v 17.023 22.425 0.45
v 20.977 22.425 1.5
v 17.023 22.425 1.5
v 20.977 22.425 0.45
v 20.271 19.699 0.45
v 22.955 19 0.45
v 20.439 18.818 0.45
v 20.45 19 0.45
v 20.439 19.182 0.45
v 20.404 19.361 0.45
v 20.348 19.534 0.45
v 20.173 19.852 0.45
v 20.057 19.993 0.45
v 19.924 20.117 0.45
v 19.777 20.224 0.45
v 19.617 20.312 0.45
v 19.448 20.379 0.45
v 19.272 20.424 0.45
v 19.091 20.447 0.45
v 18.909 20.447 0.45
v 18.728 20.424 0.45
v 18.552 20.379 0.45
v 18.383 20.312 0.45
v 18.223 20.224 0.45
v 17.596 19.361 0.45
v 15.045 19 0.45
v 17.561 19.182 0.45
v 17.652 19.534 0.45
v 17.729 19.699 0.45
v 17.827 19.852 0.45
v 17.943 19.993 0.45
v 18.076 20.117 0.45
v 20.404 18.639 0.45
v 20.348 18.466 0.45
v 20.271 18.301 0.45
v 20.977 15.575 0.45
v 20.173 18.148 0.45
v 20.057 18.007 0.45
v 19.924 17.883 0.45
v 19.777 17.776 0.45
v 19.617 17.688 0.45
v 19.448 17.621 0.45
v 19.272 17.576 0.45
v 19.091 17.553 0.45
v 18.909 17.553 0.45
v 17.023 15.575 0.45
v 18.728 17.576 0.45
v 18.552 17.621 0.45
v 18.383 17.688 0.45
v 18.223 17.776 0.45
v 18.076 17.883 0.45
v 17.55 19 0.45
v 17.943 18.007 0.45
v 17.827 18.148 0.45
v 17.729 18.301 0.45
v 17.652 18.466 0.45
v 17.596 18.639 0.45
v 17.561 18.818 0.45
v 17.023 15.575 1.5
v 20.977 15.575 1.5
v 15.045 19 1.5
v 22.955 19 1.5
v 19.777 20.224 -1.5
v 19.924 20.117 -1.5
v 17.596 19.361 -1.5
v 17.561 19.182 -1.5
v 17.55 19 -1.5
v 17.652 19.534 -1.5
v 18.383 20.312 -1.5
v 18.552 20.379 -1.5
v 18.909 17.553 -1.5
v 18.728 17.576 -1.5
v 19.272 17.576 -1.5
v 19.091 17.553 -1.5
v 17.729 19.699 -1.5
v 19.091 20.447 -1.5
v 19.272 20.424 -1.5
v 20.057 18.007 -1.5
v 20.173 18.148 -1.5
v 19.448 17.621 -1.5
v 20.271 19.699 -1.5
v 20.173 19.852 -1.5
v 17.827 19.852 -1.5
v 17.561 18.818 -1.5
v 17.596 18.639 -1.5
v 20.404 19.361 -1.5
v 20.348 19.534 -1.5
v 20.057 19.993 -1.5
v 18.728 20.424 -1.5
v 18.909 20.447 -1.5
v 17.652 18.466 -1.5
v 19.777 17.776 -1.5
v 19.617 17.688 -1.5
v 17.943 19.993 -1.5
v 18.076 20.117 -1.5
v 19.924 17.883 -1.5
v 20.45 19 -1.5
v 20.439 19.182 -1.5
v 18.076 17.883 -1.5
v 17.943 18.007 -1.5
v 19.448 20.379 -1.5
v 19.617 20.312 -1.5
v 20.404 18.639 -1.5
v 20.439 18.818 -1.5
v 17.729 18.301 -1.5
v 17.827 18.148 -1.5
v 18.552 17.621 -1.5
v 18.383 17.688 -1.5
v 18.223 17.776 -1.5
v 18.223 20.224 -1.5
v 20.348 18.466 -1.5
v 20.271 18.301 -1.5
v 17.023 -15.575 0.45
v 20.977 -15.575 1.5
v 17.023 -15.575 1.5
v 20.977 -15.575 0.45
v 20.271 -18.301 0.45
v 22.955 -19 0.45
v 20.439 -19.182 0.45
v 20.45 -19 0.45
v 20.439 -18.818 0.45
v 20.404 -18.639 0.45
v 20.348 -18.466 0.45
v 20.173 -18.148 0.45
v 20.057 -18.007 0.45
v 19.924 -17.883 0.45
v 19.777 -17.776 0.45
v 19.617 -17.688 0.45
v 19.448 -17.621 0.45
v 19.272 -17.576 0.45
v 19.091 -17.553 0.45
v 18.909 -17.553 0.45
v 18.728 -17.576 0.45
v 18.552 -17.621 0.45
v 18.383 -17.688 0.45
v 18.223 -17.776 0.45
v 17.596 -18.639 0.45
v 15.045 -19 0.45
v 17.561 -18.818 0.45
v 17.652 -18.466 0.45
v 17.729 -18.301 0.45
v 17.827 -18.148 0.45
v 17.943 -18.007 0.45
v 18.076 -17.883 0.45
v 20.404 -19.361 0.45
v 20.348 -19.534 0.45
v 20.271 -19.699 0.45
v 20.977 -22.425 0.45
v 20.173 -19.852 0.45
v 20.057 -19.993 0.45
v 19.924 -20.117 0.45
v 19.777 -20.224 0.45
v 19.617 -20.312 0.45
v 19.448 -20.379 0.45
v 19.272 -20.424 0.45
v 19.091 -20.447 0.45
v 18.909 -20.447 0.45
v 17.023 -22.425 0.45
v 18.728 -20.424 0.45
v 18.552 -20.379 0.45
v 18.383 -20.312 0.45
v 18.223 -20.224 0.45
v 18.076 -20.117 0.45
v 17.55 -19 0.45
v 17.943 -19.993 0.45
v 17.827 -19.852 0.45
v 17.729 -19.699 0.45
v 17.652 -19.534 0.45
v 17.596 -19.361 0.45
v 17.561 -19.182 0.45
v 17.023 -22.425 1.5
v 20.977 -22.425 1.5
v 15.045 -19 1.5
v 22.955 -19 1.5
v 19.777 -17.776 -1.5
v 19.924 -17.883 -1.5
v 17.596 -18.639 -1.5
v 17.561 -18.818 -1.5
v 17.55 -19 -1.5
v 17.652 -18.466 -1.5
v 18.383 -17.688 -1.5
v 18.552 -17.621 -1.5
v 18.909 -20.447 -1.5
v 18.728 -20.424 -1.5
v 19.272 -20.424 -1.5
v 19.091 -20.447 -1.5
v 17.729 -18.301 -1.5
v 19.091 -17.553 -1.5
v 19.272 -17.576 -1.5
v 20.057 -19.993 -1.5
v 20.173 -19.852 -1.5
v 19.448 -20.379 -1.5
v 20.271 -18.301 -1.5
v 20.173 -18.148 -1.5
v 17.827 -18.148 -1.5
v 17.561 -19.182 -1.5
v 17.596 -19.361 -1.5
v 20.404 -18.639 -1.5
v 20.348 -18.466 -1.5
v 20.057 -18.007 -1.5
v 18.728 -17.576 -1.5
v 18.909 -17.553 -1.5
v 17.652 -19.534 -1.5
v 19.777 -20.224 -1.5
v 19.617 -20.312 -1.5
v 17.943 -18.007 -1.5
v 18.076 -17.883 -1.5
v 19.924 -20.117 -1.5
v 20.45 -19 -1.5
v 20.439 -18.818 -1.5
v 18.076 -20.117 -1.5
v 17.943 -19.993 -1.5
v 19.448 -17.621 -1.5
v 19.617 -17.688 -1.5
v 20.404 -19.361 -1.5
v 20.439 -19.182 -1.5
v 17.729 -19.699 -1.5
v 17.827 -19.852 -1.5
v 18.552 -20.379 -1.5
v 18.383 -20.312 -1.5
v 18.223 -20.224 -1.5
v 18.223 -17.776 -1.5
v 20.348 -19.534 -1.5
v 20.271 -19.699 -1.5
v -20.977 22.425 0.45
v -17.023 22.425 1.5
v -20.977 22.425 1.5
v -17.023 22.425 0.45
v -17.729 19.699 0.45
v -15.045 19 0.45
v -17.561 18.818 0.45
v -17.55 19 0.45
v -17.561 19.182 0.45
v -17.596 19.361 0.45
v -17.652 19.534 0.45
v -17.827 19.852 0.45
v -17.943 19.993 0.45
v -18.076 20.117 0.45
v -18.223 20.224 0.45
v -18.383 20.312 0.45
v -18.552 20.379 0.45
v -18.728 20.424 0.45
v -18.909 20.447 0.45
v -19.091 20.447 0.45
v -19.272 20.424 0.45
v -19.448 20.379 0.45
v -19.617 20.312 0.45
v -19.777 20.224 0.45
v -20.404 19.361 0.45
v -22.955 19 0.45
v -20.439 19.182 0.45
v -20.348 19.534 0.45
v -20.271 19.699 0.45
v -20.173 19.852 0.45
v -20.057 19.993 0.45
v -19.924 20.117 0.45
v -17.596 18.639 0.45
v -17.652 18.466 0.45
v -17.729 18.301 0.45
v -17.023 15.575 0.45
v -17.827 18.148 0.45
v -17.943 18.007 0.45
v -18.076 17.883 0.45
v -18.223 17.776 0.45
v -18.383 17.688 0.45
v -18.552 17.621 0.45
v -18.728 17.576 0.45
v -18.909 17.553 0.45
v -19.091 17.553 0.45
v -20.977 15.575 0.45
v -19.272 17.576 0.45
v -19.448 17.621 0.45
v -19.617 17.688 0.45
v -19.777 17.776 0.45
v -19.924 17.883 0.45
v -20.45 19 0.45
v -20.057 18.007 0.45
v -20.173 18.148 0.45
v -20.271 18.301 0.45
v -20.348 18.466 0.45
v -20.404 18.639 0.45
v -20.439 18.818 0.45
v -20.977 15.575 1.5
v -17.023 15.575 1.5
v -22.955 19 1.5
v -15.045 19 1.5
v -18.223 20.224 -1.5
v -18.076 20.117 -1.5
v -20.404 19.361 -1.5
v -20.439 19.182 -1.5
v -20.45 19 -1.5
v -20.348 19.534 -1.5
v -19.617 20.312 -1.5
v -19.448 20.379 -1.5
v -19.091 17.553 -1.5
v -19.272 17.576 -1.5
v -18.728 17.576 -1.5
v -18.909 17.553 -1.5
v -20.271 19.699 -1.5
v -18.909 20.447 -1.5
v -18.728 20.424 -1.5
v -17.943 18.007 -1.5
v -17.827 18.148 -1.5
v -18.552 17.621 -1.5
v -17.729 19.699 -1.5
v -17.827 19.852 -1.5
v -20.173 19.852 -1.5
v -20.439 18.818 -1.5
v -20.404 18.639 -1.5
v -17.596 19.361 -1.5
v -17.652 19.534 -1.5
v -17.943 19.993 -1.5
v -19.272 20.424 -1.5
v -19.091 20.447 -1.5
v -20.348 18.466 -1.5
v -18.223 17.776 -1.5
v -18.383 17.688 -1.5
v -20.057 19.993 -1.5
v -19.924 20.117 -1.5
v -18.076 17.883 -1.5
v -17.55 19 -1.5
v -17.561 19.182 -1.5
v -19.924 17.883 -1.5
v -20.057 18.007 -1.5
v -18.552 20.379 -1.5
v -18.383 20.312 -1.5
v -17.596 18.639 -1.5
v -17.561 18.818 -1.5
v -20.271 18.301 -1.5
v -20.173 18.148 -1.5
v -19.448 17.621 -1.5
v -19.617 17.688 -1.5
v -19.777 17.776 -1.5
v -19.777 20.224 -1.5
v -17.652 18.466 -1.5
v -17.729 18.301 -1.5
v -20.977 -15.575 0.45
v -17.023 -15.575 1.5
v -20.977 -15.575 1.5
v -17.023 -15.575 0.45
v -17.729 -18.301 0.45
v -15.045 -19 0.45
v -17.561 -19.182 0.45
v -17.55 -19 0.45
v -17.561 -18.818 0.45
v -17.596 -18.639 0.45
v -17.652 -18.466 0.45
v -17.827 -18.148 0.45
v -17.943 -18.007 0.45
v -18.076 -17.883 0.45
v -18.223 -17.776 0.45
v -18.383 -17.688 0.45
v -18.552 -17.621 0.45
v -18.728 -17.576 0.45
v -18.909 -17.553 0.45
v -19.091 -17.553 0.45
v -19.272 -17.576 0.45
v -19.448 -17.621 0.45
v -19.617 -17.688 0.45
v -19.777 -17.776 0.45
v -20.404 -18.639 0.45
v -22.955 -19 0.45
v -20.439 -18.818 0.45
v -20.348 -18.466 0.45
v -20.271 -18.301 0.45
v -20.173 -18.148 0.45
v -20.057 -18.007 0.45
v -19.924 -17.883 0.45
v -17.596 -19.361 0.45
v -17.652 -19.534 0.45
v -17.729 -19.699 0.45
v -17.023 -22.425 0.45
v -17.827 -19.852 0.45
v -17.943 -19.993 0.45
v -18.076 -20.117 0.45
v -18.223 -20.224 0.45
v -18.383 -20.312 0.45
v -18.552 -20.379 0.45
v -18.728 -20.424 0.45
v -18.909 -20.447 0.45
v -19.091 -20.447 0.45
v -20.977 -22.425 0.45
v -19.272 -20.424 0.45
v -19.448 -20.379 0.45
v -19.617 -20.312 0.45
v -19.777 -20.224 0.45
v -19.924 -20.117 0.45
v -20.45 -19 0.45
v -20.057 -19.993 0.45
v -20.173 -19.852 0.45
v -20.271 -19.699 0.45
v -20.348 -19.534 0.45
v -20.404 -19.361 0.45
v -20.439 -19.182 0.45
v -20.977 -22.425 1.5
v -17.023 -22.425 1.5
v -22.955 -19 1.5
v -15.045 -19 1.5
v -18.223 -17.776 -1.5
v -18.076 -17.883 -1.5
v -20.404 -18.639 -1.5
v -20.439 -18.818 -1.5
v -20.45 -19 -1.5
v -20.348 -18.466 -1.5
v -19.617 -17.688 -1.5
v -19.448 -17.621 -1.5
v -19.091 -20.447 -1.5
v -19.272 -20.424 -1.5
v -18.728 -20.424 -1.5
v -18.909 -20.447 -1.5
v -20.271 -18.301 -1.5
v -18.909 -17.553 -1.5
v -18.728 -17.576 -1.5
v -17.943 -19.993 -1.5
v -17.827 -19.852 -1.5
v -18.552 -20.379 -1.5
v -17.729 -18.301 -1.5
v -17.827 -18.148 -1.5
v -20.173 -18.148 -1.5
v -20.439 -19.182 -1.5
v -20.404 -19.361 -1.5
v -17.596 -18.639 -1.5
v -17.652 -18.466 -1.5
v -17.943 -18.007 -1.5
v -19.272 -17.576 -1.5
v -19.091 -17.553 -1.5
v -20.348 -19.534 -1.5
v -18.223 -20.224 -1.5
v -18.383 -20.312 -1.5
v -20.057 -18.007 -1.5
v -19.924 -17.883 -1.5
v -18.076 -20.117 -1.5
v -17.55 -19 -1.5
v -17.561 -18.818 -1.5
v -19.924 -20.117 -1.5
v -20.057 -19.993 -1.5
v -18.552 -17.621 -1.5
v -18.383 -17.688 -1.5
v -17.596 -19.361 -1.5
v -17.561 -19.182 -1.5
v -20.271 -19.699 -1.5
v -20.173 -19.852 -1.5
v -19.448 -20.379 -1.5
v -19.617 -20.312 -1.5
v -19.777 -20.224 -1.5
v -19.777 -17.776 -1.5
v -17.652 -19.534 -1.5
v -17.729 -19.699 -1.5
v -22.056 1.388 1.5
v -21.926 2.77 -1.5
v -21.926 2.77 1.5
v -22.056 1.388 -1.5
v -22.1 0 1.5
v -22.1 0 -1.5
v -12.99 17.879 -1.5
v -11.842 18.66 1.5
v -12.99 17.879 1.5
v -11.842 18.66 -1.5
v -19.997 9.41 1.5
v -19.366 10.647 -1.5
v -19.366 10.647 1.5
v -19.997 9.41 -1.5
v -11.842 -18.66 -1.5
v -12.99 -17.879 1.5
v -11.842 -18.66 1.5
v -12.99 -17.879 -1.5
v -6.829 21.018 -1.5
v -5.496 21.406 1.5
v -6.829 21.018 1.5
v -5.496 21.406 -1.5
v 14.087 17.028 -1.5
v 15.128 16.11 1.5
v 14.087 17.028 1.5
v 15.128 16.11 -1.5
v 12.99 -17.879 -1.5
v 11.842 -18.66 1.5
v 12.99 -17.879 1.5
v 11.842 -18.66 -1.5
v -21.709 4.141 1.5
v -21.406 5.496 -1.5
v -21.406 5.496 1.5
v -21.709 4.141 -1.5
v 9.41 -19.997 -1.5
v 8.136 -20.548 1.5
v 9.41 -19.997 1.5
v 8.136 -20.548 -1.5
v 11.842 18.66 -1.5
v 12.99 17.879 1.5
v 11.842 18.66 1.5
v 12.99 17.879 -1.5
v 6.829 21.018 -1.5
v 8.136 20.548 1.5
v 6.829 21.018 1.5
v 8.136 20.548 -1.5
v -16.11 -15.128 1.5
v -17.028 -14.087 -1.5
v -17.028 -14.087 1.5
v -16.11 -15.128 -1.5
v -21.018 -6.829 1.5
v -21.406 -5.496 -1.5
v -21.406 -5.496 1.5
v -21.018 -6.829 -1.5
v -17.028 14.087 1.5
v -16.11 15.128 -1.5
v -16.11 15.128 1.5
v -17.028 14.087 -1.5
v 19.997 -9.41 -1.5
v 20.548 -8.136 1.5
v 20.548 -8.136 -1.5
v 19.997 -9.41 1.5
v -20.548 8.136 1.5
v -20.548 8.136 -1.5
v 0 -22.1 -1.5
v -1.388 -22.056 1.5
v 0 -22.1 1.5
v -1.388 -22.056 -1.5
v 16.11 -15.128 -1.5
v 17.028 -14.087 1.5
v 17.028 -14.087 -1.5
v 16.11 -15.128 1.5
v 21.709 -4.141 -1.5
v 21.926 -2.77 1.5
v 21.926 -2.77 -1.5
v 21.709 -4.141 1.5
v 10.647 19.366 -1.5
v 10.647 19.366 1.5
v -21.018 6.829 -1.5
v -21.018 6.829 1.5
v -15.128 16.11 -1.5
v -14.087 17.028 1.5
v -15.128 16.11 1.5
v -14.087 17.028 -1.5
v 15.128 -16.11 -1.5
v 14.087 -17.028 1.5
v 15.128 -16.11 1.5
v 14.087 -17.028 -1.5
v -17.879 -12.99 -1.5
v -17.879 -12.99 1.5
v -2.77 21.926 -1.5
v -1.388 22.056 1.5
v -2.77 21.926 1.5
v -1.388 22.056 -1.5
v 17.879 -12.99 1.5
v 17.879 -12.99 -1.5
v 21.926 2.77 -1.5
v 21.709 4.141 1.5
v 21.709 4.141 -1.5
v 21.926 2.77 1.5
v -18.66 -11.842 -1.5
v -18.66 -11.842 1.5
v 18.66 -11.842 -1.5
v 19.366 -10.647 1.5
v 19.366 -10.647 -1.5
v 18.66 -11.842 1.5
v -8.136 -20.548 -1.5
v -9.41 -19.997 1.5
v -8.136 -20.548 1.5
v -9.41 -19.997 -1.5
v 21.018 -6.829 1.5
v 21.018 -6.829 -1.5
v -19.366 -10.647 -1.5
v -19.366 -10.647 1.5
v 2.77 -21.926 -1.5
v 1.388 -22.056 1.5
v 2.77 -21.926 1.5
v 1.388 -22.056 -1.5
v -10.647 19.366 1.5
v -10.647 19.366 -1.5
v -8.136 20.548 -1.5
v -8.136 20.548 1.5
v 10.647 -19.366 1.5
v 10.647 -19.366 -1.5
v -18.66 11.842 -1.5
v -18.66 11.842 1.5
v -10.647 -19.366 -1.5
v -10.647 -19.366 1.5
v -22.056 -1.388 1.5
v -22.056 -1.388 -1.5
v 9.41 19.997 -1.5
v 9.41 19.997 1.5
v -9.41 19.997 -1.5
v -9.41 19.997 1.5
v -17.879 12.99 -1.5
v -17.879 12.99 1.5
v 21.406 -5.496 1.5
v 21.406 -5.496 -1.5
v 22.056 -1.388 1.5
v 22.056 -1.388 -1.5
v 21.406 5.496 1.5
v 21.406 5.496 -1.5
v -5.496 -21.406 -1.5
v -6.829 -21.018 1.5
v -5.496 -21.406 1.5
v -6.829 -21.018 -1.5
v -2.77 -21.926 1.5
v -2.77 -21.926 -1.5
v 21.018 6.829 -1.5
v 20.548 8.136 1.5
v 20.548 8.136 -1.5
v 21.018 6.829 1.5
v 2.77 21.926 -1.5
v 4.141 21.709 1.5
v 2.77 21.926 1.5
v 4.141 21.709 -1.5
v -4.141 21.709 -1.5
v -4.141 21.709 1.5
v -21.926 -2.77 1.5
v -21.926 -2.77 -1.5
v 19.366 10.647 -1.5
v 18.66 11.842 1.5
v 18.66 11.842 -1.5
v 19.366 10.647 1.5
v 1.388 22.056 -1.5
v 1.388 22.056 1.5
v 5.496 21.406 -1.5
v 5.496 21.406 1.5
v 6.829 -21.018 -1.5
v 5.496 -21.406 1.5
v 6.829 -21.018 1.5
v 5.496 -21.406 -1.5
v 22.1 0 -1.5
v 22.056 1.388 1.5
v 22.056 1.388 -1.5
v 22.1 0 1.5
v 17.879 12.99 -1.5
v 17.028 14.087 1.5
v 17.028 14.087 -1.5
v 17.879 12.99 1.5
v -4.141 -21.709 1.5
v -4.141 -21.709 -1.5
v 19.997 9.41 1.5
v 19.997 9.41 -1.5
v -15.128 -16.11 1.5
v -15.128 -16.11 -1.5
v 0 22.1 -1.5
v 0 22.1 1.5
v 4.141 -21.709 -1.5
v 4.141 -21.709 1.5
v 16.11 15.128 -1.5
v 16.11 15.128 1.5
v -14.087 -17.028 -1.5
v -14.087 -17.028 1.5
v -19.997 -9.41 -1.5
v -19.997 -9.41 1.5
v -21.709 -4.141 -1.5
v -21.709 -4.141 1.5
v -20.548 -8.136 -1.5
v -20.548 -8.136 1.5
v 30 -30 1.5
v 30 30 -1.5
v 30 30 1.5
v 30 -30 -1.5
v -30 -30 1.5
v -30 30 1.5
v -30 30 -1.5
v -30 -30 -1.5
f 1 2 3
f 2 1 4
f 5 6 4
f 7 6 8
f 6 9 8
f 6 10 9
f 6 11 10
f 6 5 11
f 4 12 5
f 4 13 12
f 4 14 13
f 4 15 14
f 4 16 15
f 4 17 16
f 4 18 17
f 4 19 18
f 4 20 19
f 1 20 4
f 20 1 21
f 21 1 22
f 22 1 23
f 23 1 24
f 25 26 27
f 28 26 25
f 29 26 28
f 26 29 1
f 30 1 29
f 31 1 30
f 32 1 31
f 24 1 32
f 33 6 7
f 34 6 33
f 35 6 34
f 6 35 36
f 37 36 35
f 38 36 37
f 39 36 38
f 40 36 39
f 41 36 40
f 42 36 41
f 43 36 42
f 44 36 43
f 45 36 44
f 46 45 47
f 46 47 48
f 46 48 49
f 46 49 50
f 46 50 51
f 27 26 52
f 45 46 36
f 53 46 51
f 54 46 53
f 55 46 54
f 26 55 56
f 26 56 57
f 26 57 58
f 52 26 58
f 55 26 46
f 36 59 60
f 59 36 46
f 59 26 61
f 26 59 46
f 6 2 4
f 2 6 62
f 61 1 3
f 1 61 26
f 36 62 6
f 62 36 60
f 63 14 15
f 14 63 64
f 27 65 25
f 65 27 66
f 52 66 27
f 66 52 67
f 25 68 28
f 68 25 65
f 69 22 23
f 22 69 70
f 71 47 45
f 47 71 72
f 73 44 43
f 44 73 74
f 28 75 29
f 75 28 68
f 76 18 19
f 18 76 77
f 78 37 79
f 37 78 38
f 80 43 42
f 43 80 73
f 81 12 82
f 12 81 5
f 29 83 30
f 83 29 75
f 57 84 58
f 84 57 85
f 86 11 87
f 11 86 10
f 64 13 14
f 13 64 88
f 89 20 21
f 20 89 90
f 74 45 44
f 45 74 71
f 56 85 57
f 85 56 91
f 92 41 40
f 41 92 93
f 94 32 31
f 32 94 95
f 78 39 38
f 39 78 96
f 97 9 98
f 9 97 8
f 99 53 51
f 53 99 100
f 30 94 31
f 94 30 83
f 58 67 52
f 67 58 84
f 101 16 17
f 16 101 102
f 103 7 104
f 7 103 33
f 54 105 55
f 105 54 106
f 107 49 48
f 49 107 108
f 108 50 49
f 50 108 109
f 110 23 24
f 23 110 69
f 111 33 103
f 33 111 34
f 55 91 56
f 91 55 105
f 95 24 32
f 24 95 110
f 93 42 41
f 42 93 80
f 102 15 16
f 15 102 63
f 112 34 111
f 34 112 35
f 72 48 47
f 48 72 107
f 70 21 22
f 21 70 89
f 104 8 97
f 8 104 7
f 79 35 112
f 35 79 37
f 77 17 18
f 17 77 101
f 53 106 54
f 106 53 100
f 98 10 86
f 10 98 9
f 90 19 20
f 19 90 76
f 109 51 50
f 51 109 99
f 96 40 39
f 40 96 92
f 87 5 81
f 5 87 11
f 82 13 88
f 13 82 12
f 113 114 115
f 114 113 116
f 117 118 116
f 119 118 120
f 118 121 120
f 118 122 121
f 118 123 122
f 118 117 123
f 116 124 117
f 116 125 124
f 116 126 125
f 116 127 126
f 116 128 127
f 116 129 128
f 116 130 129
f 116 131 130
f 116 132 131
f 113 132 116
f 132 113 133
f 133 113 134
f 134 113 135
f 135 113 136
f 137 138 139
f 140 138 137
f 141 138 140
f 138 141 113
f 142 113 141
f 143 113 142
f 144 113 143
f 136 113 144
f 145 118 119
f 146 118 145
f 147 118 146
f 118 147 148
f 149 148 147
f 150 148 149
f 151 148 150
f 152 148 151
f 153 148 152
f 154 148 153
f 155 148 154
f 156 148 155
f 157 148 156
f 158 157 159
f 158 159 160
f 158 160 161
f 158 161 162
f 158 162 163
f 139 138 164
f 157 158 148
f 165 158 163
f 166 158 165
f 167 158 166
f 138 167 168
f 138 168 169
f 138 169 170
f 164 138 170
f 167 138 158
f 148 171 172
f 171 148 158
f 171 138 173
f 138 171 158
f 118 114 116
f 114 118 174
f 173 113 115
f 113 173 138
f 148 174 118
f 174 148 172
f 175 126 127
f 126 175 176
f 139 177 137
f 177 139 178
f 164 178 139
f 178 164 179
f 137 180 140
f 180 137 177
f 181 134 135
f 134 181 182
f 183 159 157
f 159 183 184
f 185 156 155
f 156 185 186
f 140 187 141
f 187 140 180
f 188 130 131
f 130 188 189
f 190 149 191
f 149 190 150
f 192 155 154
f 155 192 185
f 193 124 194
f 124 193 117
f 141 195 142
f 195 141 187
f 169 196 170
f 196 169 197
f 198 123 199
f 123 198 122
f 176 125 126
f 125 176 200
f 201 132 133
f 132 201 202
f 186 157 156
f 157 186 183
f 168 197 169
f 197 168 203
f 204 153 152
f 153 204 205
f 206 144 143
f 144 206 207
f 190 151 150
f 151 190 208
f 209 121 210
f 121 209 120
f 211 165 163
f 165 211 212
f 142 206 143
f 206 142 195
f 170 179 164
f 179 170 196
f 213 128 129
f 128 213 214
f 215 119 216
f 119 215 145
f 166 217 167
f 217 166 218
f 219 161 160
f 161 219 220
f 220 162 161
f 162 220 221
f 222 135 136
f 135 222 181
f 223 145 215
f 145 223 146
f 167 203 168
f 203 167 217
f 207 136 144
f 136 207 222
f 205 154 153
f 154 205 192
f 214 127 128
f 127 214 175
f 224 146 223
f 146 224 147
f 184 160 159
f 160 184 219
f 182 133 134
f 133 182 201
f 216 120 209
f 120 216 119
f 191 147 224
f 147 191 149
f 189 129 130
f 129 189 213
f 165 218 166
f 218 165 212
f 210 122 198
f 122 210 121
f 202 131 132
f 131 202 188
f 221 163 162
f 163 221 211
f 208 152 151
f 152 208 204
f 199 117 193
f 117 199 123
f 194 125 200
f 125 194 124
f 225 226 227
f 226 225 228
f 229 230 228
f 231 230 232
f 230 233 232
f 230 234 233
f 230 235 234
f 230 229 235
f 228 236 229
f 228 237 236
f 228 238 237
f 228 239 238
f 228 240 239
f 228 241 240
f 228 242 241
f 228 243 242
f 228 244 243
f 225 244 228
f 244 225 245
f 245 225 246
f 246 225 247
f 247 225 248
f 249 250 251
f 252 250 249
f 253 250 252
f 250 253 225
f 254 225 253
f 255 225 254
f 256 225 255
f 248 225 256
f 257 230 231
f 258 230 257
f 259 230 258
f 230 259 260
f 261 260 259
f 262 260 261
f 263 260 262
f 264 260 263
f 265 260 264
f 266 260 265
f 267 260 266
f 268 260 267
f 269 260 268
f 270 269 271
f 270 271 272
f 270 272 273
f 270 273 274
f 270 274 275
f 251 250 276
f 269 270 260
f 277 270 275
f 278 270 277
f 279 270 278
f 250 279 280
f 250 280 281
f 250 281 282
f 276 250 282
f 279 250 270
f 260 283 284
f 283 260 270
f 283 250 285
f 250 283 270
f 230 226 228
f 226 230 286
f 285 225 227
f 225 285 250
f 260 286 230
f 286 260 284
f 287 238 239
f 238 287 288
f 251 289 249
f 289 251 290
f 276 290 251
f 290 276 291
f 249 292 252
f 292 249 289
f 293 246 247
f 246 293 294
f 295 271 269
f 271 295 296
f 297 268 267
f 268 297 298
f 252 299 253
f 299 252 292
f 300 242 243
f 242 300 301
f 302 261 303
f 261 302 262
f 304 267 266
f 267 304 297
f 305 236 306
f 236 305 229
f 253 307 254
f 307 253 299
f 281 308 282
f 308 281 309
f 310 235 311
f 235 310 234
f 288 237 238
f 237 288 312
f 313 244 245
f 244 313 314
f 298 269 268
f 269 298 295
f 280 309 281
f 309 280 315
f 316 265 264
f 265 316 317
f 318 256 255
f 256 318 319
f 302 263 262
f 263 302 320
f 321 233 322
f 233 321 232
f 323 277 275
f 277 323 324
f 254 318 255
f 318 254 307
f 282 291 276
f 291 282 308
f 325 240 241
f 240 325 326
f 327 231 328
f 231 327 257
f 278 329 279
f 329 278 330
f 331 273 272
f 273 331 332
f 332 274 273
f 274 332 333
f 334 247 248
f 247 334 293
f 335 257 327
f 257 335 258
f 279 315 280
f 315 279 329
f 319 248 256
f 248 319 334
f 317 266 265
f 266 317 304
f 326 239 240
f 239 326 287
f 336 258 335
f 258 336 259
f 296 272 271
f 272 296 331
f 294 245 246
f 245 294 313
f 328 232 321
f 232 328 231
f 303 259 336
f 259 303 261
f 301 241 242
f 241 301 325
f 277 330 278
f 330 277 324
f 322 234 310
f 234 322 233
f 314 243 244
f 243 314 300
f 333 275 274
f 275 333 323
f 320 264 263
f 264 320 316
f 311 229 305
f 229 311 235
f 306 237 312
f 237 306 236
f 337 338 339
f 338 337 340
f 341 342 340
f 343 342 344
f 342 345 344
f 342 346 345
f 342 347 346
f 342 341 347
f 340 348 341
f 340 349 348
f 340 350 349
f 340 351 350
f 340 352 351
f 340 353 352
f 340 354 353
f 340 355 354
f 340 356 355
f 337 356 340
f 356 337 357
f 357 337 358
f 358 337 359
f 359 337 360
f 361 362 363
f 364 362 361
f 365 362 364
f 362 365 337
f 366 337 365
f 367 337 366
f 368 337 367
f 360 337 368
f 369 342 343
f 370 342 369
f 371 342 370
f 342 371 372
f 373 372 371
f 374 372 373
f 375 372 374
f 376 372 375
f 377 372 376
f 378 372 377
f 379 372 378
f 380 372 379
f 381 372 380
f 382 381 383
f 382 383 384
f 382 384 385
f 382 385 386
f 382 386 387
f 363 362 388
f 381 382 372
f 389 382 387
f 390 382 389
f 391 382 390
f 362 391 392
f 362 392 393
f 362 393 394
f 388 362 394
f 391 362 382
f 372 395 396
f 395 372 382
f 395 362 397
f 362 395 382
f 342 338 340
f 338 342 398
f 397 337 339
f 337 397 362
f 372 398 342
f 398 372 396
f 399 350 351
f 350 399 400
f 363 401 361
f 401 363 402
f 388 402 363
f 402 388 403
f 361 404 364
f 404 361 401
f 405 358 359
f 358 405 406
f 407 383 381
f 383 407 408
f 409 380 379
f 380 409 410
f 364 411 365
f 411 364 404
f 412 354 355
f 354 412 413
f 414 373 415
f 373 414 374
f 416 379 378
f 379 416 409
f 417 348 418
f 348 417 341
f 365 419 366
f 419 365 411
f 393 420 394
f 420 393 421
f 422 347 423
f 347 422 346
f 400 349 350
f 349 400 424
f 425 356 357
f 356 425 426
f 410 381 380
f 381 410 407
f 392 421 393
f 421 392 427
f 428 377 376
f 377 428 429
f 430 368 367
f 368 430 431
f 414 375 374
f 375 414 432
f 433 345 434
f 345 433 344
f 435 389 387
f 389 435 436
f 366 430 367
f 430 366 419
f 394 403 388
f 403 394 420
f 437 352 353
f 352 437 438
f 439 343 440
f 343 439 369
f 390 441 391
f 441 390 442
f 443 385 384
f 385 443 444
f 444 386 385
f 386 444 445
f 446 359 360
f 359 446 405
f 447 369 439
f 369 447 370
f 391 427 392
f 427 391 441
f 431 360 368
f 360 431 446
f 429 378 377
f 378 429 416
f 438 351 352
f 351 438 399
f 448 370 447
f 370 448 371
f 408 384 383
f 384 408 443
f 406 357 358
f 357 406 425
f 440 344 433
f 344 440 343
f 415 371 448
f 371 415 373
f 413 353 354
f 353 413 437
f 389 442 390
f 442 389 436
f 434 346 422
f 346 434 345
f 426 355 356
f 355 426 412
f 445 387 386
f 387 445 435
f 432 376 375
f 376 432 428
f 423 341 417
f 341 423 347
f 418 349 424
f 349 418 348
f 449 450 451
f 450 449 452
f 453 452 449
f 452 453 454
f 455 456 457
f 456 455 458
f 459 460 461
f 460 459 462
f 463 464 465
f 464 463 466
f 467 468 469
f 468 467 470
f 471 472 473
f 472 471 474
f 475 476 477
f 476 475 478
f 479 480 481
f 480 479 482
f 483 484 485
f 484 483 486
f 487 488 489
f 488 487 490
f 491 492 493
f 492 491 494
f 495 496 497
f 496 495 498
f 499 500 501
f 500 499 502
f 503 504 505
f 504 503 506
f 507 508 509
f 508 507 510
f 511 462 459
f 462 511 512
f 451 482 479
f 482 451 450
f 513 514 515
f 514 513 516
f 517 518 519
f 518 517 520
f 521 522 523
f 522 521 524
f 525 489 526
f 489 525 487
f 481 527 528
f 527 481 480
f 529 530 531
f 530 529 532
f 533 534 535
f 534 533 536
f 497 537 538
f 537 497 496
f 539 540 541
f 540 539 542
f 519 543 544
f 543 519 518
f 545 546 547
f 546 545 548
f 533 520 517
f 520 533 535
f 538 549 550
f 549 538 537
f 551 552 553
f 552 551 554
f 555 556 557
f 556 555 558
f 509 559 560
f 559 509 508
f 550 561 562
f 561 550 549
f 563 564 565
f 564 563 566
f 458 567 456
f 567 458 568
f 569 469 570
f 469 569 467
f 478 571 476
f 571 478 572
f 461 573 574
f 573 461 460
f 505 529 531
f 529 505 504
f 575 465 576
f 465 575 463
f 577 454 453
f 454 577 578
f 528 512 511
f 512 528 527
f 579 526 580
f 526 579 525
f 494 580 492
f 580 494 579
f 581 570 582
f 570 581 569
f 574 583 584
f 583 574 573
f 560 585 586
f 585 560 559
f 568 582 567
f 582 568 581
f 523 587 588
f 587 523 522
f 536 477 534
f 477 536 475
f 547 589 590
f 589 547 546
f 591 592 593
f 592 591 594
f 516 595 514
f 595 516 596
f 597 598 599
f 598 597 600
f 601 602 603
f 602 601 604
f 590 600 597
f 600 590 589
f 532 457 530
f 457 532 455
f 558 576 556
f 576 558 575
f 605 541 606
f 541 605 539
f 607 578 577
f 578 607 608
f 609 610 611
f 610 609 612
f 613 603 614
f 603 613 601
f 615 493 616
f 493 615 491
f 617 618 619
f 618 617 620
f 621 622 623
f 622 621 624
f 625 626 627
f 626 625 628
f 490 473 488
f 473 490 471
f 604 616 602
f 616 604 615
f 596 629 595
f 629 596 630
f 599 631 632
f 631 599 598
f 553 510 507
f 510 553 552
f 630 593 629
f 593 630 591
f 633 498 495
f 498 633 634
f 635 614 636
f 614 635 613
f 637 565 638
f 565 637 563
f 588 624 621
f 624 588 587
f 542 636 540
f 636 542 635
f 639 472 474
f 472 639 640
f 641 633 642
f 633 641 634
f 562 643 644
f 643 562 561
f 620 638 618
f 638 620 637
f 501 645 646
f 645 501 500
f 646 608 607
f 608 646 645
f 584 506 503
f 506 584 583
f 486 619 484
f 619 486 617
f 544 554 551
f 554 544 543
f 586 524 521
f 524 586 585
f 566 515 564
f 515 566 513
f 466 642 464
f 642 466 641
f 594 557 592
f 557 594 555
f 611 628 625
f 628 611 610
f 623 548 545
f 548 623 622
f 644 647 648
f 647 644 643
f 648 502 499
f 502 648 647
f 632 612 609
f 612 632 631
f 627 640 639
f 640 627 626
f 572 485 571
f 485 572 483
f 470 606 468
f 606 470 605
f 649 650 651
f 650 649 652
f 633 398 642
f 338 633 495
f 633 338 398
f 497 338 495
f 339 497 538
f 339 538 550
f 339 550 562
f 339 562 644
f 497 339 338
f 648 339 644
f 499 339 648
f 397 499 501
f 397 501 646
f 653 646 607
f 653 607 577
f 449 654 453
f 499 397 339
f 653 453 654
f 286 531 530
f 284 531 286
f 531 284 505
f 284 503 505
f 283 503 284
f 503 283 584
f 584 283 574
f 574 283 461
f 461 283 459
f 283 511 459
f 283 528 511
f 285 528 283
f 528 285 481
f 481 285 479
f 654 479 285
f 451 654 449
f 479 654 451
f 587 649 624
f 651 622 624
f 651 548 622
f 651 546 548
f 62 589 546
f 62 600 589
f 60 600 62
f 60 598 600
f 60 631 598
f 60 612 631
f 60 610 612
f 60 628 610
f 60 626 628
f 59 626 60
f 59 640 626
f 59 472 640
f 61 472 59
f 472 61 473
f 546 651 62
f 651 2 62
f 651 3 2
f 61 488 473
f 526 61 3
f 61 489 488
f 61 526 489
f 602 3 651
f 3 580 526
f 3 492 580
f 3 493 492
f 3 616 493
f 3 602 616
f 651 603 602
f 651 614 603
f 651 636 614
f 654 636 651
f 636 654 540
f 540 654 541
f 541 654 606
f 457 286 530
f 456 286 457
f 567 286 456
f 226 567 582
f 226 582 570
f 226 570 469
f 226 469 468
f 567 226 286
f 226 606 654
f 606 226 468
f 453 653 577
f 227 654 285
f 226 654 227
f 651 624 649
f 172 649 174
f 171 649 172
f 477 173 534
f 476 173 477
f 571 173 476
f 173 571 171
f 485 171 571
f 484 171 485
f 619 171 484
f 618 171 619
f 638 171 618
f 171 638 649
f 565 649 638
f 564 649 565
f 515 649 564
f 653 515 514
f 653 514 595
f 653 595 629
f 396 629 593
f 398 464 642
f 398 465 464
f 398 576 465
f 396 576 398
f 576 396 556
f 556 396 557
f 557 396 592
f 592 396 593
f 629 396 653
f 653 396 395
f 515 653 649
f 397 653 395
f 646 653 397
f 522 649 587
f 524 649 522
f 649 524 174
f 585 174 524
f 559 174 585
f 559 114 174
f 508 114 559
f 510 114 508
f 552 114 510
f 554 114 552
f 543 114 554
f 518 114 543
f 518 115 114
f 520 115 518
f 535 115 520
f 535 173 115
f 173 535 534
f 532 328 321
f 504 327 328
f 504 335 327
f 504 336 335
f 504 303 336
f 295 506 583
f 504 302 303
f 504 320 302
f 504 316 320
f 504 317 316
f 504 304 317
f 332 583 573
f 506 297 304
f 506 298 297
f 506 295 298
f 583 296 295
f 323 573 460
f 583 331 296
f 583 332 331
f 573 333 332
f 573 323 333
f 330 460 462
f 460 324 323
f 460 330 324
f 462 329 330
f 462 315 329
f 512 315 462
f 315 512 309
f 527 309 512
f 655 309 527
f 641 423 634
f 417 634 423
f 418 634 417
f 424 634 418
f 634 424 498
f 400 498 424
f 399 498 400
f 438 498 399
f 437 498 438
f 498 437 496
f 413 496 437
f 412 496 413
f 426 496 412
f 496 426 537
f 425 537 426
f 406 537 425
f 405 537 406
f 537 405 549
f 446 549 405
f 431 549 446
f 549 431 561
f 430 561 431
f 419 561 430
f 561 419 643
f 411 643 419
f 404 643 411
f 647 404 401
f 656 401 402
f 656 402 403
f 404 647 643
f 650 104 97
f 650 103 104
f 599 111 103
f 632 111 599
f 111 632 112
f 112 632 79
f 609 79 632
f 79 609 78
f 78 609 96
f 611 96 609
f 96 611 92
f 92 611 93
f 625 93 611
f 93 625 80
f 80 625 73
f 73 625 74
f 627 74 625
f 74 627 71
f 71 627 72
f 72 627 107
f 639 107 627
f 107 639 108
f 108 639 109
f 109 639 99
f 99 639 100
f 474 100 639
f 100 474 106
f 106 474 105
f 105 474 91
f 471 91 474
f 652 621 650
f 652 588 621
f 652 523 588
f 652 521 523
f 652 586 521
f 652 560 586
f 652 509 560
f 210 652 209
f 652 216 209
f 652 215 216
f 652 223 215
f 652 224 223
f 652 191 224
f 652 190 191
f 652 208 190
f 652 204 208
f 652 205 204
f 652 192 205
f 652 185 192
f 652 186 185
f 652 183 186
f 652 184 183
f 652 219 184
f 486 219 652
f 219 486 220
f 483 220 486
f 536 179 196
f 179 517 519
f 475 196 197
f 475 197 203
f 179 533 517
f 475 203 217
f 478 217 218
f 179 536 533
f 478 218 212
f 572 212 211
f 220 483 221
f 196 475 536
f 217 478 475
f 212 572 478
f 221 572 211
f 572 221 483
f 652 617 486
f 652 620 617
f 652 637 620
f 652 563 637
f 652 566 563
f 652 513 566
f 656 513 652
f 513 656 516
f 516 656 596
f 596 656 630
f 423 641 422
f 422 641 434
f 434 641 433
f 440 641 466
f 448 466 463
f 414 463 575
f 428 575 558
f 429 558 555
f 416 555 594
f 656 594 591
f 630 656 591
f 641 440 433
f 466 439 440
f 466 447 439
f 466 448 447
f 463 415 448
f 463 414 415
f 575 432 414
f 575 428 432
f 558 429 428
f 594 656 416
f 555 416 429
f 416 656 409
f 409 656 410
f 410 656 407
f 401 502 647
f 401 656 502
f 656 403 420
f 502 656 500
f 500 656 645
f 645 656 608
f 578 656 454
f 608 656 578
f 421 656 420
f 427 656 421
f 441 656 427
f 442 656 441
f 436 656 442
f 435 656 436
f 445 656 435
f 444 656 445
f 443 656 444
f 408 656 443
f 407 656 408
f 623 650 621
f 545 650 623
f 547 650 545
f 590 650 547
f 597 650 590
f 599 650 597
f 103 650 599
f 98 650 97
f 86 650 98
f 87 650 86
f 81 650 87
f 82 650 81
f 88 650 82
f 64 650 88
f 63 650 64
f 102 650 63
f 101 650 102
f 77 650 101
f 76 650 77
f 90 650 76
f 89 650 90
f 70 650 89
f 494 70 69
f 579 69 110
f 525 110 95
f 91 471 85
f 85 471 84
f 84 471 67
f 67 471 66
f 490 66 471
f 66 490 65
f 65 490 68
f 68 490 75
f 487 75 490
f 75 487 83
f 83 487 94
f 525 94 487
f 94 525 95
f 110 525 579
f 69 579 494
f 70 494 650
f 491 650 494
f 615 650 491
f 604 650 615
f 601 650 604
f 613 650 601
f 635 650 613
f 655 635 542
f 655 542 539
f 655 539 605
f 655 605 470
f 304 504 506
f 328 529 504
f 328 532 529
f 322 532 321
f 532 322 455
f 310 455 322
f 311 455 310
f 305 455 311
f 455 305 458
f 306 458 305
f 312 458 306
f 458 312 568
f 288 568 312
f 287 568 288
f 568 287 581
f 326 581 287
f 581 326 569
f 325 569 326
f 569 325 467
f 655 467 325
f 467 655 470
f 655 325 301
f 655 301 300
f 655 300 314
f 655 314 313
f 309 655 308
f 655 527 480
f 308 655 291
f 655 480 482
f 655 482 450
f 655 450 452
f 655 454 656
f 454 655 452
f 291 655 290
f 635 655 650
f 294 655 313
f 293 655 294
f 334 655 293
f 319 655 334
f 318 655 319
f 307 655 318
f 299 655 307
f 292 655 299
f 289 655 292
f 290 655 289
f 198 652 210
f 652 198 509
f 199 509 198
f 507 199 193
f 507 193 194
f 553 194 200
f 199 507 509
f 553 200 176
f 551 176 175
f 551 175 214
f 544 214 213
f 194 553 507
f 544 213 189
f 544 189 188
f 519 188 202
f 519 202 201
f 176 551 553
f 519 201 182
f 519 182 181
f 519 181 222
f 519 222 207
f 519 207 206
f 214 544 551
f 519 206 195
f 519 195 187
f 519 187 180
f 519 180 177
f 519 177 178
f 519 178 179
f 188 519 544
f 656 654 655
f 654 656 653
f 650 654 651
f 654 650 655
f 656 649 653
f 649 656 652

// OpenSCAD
// file: ../../lib/material.scad
module gray() {
	color([.4, .4, .4]) children([0:$children-1]);
}

module black() {
	color([.3, .3, .3]) children([0:$children-1]);
}

module orange() {
	color([1, .7, 0]) children([0:$children-1]);
}

module yellow() {
	color([.7, .7, .3]) children([0:$children-1]);
}

module green_pcb() {
	color([.0, .5, .25]) children([0:$children-1]);
}

module metal() {
	color([.7, .7, .7]) children([0:$children-1]);
}

module gold() {
	color([.8, .5, .0]) children([0:$children-1]);
}

module stainless(no="1.4301") {
	color([0.45, 0.43, 0.5]) children([0:$children-1]);
}

module steel(no) {
	color([0.65, 0.67, 0.72]) children([0:$children-1]);
}

module iron(no="ST37") {
	color([0.36, 0.33, 0.33]) children([0:$children-1]);
}

module plastic() {
	color([1, .7, 0]) children([0:$children-1]);
}
// file: ../../lib/bolt/metric_bolt.scad
include <bolt.scad>;

// https://www.fairburyfastener.com/xdims_metric_nuts.htm

//  hex_nut (height, thread_d, size, tolerance, quality, thread, pitch);
//hex_nut (1/8, 1/4, 3/8, 1/128, 32, 1, "imperial", 28);

/*
    hex_nut (height, thread_d, size, tolerance, quality, bool_cut, thread, pitch);
        height      =   height of the nut
        thread_d    =   threaded hole diameter width
        size        =   [ 0.00, 0.00, 0.00 ]hexagonal nut size
        tolerance   =   tolerance of entire measures (always positive, addition and subtraction already
                        calculated within the script
        quality     =   overall quality of the returned function (ref. $fn)
        bool_cut    =   do (1) or not (0) the nut cut
        *thread     =   string variable declaring measure type -> "metric" or "imperial"
        *pitch      =   stands for thread pitch      
*/

module m2_hex_nut() {
  hex_nut(1.6, 2, 4.32, 0.01, 32, 1, "metric", 0.4);
}

module m2_5_hex_nut() {
  hex_nut(2, 2.5, 5.45, 0.01, 32, 1, "metric", 0.45);
}

module m3_hex_nut() {
  hex_nut(2.3, 3, 6.01, 0.01, 32, 1, "metric", 0.5);
}

module m4_hex_nut() {
  hex_nut(3.2, 4, 7.66, 0.01, 32, 1, "metric", 0.7);
}

module m5_hex_nut() {
  hex_nut(4.7, 5, 8.79, 0.01, 32, 1, "metric", 0.8);
}

module m6_hex_nut() {
  hex_nut(5.2, 6, 11.05, 0.01, 32, 1, "metric", 1);
}

module m8_hex_nut() {
  hex_nut(6.8, 8, 14.38, 0.01, 32, 1, "metric", 1.25);
}

module m10_hex_nut() {
  hex_nut(8.4, 10, 17.77, 0.01, 32, 1, "metric", 1.5);
}

//  hex_bolt (lenght, thread_d, head_h, head_d, tolerance, quality, thread, pitch);

/*
    hex_bolt (lenght, thread_d, head_h, head_d, tolerance, quality, bool_cut, thread, pitch);
        lenght      =   threaded bar lenght
        thread_d    =   threaded bar diameter width
        head_h      =   hexagonal bolt head height
        head_d      =   hexagonal bolt head size
        tolerance   =   tolerance of entire measures (always positive, addition and subtraction already
                        calculated within the script
        quality     =   overall quality of the returned function (ref. $fn)
        bool_cut    =   do (1) or not (0) the nut cut
        *thread     =   string variable declaring measure type -> "metric" or "imperial"
        *pitch      =   stands for thread pitch
*/

module m2_hex_bolt(lenght=26,head_h=2) {
  translate([0, 0, -lenght])
    hex_bolt(lenght, 2, head_h, 4.32, 0.1, 32, 1, "metric", 0.4);
}

module m2_5_hex_bolt(lenght=26,head_h=2) {
  translate([0, 0, -lenght])
    hex_bolt(lenght, 2.5, head_h, 5.45, 0.1, 32, 1, "metric", 0.45);
}

module m3_hex_bolt(lenght=26,head_h=2) {
  translate([0, 0, -lenght])
    hex_bolt(lenght, 3, head_h, 6.01, 0.1, 32, 1, "metric", 0.5);
}

module m4_hex_bolt(lenght=26,head_h=2) {
  translate([0, 0, -lenght])
    hex_bolt(lenght, 4, head_h, 7.66, 0.1, 32, 1, "metric", 0.7);
}

module m5_hex_bolt(lenght=26,head_h=2) {
  translate([0, 0, -lenght])
    hex_bolt(lenght, 5, head_h, 8.79, 0.1, 32, 1, "metric", 0.8);
}

module m6_hex_bolt(lenght=26,head_h=2) {
  translate([0, 0, -lenght])
    hex_bolt(lenght, 6, head_h, 11.05, 0.1, 32, 1, "metric", 1);
}

module m8_hex_bolt(lenght=26,head_h=6.8) {
  translate([0, 0, -lenght])
    hex_bolt(lenght, 8, head_h, 14.38, 0.1, 32, 1, "metric", 1.25);
}

module m10_hex_bolt(lenght=26,head_h=8.4) {
  translate([0, 0, -lenght])
    hex_bolt(lenght, 10, head_h, 17.77, 0.1, 32, 1, "metric", 1.5);
}

//m8_hex_bolt_extrude(20, 1, 0.1);

module m1_6_hex_bolt_extrude(depth, head, clear) {
  translate([0,0,-depth/2]) hex_bolt_extrude(depth, head, 1.6, 3.41, clear);
}

module m2_hex_bolt_extrude(depth, head, clear) {
  translate([0,0,-depth/2]) hex_bolt_extrude(depth, head, 2, 4.32, clear);
}

module m2_5_hex_bolt_extrude(depth, head, clear) {
  translate([0,0,-depth/2]) hex_bolt_extrude(depth, head, 2.5, 5.45, clear);
}

module m3_hex_bolt_extrude(depth, head, clear) {
  translate([0,0,-depth/2]) hex_bolt_extrude(depth, head, 3, 6.01, clear);
}

module m4_hex_bolt_extrude(depth, head, clear) {
  translate([0,0,-depth/2]) hex_bolt_extrude(depth, head, 4, 7.66, clear);
}

module m5_hex_bolt_extrude(depth, head, clear) {
  translate([0,0,-depth/2]) hex_bolt_extrude(depth, head, 5, 8.79, clear);
}

module m6_hex_bolt_extrude(depth, head, clear) {
  translate([0,0,-depth/2]) hex_bolt_extrude(depth, head, 6, 11.05, clear);
}

module m8_hex_bolt_extrude(depth, head, clear) {
  translate([0,0,-depth/2]) hex_bolt_extrude(depth, head, 8, 14.38, clear);
}

module m10_hex_bolt_extrude(depth, head, clear) {
  translate([0,0,-depth/2]) hex_bolt_extrude(depth, head, 10, 17.77, clear);
}

module hex_bolt_extrude(depth, head_h, body, head, clear) {
  translate([0,0,head_h/2]) rotate([0, 0, 90]) hex_head_extrude(head_h, head, clear);
  translate([0,0,head_h]) bolt_body_extrude(depth-head_h+clear, body, clear);
}

module bolt_body_extrude(height, diameter, clear) {
    radius = diameter/2+clear*2;
    cylinder(h=height, r1=radius, r2=radius, center=false, $fn=50);
}

module hex_head_extrude(height, diameter, clear) {
    height = height+clear;
	radius = diameter+1+clear*4;
    angle = 360/6;
	cote = (radius)/tan(angle);

	union() {
		rotate([0,0,0])
			cube([radius,cote,height],center=true);
		rotate([0,0,angle])
			cube([radius,cote,height],center=true);
		rotate([0,0,2*angle])
			cube([radius,cote,height],center=true);
	}
}
// file: ../../lib/nut/nut_hexagonal.scad
//nut_M(3,1,0.1);
//nut_M(6,1,0.1);
//nut_M_border(6,10,3,0.1);

module nut_M(size,height,clear)
{
    nut_hexagonal(size,height,clear);
}

module nut_M_border(size,radius,height,clear)
{
    difference() {
        //cylinder(r=radius, h=height,center=true);
        nut_hexagonal(radius,height,clear);
        nut_hexagonal(size,height,clear);
    }
}

module nut_hexagonal(radius,height,clear)
{
    height = height+clear;
	radius = radius+clear;
    angle = 360/6;
	cote = (radius)/tan(angle);

	union()
    {
		rotate([0,0,0])
			cube([radius,cote,height],center=true);
		rotate([0,0,angle])
			cube([radius,cote,height],center=true);
		rotate([0,0,2*angle])
			cube([radius,cote,height],center=true);
	}
}
// file: ../../lib/plate.scad
include <./material.scad>;

module plate(height=50, width=50, depth=10) {
  plastic() {
    cube([height, width, depth], true);
  }
}
// file: ../../lib/connector/connector_power.scad
include <../nut/nut_hexagonal.scad>;
include <../bolt/metric_bolt.scad>;

sides = 100;

//connector_IP54_extrusion(5, 1, 0.1);

module connector_IP54_extrusion(depth, bolt_depth, clear)
{
    conn_diameter = 44 + 2*clear;
    hole_position = 19;

    cylinder(r=conn_diameter/2, h=depth+2*clear,center=true, $fn=sides);
    translate([-hole_position,hole_position,0])
        m2_5_hex_bolt_extrude(depth, bolt_depth, 0.1);
    translate([-hole_position,-hole_position,0])
        m2_5_hex_bolt_extrude(depth, bolt_depth, 0.1);
    translate([hole_position,hole_position,0])
        m2_5_hex_bolt_extrude(depth, bolt_depth, 0.1);
    translate([hole_position,-hole_position,0])
        m2_5_hex_bolt_extrude(depth, bolt_depth, 0.1);
}
// main file
include <../../lib/connector/connector_power.scad>;
include <../../lib/plate.scad>;

difference() {
    plate(60,60,3);
    rotate([0,180,0]) {
        connector_IP54_extrusion(3,1,0.1);
    }
}
